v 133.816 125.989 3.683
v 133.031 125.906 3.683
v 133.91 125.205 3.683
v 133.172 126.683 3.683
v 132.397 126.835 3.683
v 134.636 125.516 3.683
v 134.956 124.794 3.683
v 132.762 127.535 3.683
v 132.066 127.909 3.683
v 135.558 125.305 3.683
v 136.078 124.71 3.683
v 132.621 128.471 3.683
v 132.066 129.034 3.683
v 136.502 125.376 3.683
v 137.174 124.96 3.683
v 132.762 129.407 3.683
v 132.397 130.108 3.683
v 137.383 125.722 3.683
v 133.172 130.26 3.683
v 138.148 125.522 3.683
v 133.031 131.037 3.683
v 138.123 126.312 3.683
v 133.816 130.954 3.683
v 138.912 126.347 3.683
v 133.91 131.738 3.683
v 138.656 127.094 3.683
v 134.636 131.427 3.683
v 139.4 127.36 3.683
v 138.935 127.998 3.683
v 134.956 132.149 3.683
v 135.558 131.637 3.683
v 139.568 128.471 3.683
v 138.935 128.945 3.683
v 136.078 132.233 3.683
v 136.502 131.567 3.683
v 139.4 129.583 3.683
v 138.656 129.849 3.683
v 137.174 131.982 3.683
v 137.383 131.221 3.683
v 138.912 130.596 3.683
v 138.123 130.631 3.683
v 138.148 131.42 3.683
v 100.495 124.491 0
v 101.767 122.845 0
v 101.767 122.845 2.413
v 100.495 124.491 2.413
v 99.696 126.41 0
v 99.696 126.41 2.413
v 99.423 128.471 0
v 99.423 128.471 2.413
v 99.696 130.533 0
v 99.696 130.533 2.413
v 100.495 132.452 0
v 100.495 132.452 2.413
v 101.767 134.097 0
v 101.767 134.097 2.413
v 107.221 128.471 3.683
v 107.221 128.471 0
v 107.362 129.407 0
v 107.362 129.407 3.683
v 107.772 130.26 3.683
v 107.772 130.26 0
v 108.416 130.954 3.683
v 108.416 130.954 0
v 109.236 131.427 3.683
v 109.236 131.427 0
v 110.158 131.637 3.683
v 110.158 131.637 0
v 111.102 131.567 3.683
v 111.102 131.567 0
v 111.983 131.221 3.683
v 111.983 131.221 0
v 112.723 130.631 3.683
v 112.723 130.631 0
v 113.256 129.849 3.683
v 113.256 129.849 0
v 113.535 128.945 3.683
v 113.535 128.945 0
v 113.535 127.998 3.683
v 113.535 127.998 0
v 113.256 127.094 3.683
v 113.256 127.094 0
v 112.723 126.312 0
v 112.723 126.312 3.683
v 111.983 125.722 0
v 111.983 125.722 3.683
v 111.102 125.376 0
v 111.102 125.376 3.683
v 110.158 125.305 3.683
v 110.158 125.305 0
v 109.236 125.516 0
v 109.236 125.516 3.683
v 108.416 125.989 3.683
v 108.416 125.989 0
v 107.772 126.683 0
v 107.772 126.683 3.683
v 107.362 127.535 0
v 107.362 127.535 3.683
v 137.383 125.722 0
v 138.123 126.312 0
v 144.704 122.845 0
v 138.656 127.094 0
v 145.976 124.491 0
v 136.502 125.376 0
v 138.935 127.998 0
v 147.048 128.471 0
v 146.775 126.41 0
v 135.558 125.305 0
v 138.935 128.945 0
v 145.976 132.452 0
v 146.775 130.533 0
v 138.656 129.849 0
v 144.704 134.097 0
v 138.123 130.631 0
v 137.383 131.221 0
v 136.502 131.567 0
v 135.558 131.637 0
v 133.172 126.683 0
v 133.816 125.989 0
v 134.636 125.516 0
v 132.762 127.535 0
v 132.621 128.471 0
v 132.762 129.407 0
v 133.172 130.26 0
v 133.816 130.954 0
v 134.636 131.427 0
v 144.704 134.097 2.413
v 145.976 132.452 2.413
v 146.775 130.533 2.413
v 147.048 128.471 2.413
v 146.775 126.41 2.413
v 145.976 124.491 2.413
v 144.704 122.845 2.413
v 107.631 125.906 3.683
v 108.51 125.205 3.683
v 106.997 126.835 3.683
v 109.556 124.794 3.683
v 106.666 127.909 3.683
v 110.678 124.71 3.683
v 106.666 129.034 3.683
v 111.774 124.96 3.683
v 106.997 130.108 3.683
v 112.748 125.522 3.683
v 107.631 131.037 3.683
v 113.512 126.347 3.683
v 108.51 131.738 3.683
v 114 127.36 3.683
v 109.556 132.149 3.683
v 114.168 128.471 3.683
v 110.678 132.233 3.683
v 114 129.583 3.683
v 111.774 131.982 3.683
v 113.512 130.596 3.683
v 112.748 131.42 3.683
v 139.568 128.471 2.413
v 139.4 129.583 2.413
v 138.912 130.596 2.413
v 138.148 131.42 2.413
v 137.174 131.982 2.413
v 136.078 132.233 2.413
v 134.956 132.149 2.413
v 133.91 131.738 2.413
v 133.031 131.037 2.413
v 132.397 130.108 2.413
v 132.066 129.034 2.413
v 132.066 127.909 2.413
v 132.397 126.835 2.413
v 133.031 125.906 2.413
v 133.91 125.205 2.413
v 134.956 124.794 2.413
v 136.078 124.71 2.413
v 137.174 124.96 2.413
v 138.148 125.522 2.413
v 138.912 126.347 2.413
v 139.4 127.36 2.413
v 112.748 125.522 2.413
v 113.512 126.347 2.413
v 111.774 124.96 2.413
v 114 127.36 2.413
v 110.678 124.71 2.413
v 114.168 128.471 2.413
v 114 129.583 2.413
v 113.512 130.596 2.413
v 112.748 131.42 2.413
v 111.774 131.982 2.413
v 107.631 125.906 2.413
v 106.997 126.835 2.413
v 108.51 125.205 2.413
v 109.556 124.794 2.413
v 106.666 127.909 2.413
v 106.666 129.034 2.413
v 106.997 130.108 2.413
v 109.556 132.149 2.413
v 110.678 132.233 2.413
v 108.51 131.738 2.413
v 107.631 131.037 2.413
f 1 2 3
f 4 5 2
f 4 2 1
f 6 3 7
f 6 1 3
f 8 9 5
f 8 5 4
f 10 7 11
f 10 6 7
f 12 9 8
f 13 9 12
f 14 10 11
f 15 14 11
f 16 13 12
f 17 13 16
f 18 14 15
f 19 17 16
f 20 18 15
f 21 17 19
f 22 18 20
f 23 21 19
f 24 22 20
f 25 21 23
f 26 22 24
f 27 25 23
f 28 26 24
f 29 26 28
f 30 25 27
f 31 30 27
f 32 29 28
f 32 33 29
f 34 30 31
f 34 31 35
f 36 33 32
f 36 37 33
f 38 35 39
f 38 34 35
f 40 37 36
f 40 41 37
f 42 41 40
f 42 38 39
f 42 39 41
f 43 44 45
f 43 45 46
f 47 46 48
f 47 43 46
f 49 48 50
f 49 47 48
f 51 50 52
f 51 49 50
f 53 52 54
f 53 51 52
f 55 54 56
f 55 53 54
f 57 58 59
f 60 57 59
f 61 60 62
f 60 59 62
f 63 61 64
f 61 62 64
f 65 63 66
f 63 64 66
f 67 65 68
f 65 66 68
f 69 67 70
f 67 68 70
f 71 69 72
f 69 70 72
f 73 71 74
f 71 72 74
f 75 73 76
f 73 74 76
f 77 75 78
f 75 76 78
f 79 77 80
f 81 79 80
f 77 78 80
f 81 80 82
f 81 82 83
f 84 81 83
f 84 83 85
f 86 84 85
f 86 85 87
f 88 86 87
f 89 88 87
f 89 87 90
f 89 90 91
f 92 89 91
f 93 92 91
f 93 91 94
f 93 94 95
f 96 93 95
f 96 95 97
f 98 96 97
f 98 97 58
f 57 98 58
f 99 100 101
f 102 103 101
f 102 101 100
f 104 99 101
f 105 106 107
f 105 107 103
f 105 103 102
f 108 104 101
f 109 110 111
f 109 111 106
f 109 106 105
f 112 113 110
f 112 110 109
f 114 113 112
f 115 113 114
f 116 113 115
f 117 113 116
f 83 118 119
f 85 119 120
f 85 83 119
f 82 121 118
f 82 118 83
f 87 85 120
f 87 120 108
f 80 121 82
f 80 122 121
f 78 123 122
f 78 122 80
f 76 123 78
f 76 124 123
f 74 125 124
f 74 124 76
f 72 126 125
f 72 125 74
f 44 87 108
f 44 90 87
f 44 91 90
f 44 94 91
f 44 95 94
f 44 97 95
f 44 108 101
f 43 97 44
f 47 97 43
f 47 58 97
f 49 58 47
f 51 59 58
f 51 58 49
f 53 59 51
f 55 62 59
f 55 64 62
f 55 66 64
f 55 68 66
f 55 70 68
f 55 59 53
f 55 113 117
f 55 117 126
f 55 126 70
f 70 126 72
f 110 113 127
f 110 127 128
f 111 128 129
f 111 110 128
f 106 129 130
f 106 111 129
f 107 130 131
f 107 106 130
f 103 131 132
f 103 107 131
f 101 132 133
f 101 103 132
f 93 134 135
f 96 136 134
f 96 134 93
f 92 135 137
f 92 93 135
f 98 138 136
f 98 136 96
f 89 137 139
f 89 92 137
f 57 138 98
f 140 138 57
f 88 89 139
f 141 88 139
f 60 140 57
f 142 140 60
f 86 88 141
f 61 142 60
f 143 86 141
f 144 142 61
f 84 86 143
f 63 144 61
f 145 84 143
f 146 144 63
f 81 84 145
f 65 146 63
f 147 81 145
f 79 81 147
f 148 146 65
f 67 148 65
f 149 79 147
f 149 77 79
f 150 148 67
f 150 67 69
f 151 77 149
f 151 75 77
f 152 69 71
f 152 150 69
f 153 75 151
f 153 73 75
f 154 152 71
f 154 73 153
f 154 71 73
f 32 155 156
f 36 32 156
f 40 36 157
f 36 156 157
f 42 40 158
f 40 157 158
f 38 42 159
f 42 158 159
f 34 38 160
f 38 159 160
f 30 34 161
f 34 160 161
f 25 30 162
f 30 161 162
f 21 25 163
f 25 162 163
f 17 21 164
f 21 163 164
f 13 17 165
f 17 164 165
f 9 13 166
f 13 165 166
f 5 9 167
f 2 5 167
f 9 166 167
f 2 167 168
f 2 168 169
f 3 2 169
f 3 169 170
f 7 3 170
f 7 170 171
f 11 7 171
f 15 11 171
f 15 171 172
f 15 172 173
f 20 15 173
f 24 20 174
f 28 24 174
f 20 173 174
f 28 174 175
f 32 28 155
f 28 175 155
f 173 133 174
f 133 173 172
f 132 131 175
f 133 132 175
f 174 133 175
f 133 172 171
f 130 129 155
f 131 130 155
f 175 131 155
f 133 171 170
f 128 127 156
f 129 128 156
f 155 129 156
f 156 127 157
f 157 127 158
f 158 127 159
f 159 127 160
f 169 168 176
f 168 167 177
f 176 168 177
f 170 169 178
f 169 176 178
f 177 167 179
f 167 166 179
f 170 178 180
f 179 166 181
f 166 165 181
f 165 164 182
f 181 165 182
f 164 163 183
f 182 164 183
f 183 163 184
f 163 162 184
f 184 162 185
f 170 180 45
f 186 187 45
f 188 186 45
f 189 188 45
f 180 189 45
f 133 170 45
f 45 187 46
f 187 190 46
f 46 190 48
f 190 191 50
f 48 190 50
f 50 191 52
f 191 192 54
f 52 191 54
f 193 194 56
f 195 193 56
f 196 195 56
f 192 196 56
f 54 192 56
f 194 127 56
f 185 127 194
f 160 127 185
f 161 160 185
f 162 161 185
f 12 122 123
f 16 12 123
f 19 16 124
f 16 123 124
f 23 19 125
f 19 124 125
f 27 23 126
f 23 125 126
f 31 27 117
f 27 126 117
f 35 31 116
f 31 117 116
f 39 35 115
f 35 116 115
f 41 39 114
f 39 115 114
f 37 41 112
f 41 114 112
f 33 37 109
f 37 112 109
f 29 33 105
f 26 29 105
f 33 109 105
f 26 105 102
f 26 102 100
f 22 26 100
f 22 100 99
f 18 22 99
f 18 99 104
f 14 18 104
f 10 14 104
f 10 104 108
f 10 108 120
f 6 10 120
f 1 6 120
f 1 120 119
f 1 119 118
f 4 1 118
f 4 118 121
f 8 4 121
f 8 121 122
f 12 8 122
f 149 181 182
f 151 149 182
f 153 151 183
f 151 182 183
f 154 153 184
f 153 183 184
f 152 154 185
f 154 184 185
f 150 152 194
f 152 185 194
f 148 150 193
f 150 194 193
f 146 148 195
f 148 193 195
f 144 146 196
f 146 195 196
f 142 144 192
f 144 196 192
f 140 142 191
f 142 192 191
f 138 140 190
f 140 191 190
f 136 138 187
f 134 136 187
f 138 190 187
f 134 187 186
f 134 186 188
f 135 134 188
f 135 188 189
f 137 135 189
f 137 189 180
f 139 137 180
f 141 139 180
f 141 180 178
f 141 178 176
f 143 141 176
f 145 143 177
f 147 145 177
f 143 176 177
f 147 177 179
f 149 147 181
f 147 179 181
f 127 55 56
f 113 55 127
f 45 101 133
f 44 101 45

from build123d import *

# Parameters (mm, degrees)
EXTRUDE1_DEPTH     = 2.413
SKETCH4_R          = 3.7719
EXTRUDE3_DEPTH     = 1.27
SKETCH6_R          = 3.175
CUT_EXTRUDE1_DEPTH = 4.683


with BuildPart() as part:
    # Sketch1 → Extrude1 (new body)
    with BuildSketch(Plane.XY):
        with BuildLine():
            Line((101.766590689, 134.097427572), (144.70432984, 134.097427572))
            ThreePointArc((144.70432984, 134.097427572), (147.047960264, 128.471327572), (144.70432984, 122.845227572))
            Line((144.70432984, 122.845227572), (101.766590689, 122.845227572))
            ThreePointArc((101.766590689, 122.845227572), (99.422960264, 128.471327572), (101.766590689, 134.097427572))
        make_face()
    extrude(amount=EXTRUDE1_DEPTH)

    # Sketch4 → Extrude3 (add)
    with BuildSketch(Plane.XY.offset(2.413)):
        with Locations((135.795760264, 128.471327572)):
            Circle(SKETCH4_R)
        with Locations((110.395760264, 128.471327572)):
            Circle(SKETCH4_R)
    extrude(amount=EXTRUDE3_DEPTH)

    # Sketch6 → Cut-Extrude1 (cut, through all)
    with BuildSketch(Plane(origin=(0, 0, 0), x_dir=(-1, 0, 0), z_dir=(0, 0, -1))):
        with Locations((-135.795760264, 128.471327572)):
            Circle(SKETCH6_R)
        with Locations((-110.395760264, 128.471327572)):
            Circle(SKETCH6_R)
    extrude(amount=-CUT_EXTRUDE1_DEPTH, mode=Mode.SUBTRACT)


solid = part.part
